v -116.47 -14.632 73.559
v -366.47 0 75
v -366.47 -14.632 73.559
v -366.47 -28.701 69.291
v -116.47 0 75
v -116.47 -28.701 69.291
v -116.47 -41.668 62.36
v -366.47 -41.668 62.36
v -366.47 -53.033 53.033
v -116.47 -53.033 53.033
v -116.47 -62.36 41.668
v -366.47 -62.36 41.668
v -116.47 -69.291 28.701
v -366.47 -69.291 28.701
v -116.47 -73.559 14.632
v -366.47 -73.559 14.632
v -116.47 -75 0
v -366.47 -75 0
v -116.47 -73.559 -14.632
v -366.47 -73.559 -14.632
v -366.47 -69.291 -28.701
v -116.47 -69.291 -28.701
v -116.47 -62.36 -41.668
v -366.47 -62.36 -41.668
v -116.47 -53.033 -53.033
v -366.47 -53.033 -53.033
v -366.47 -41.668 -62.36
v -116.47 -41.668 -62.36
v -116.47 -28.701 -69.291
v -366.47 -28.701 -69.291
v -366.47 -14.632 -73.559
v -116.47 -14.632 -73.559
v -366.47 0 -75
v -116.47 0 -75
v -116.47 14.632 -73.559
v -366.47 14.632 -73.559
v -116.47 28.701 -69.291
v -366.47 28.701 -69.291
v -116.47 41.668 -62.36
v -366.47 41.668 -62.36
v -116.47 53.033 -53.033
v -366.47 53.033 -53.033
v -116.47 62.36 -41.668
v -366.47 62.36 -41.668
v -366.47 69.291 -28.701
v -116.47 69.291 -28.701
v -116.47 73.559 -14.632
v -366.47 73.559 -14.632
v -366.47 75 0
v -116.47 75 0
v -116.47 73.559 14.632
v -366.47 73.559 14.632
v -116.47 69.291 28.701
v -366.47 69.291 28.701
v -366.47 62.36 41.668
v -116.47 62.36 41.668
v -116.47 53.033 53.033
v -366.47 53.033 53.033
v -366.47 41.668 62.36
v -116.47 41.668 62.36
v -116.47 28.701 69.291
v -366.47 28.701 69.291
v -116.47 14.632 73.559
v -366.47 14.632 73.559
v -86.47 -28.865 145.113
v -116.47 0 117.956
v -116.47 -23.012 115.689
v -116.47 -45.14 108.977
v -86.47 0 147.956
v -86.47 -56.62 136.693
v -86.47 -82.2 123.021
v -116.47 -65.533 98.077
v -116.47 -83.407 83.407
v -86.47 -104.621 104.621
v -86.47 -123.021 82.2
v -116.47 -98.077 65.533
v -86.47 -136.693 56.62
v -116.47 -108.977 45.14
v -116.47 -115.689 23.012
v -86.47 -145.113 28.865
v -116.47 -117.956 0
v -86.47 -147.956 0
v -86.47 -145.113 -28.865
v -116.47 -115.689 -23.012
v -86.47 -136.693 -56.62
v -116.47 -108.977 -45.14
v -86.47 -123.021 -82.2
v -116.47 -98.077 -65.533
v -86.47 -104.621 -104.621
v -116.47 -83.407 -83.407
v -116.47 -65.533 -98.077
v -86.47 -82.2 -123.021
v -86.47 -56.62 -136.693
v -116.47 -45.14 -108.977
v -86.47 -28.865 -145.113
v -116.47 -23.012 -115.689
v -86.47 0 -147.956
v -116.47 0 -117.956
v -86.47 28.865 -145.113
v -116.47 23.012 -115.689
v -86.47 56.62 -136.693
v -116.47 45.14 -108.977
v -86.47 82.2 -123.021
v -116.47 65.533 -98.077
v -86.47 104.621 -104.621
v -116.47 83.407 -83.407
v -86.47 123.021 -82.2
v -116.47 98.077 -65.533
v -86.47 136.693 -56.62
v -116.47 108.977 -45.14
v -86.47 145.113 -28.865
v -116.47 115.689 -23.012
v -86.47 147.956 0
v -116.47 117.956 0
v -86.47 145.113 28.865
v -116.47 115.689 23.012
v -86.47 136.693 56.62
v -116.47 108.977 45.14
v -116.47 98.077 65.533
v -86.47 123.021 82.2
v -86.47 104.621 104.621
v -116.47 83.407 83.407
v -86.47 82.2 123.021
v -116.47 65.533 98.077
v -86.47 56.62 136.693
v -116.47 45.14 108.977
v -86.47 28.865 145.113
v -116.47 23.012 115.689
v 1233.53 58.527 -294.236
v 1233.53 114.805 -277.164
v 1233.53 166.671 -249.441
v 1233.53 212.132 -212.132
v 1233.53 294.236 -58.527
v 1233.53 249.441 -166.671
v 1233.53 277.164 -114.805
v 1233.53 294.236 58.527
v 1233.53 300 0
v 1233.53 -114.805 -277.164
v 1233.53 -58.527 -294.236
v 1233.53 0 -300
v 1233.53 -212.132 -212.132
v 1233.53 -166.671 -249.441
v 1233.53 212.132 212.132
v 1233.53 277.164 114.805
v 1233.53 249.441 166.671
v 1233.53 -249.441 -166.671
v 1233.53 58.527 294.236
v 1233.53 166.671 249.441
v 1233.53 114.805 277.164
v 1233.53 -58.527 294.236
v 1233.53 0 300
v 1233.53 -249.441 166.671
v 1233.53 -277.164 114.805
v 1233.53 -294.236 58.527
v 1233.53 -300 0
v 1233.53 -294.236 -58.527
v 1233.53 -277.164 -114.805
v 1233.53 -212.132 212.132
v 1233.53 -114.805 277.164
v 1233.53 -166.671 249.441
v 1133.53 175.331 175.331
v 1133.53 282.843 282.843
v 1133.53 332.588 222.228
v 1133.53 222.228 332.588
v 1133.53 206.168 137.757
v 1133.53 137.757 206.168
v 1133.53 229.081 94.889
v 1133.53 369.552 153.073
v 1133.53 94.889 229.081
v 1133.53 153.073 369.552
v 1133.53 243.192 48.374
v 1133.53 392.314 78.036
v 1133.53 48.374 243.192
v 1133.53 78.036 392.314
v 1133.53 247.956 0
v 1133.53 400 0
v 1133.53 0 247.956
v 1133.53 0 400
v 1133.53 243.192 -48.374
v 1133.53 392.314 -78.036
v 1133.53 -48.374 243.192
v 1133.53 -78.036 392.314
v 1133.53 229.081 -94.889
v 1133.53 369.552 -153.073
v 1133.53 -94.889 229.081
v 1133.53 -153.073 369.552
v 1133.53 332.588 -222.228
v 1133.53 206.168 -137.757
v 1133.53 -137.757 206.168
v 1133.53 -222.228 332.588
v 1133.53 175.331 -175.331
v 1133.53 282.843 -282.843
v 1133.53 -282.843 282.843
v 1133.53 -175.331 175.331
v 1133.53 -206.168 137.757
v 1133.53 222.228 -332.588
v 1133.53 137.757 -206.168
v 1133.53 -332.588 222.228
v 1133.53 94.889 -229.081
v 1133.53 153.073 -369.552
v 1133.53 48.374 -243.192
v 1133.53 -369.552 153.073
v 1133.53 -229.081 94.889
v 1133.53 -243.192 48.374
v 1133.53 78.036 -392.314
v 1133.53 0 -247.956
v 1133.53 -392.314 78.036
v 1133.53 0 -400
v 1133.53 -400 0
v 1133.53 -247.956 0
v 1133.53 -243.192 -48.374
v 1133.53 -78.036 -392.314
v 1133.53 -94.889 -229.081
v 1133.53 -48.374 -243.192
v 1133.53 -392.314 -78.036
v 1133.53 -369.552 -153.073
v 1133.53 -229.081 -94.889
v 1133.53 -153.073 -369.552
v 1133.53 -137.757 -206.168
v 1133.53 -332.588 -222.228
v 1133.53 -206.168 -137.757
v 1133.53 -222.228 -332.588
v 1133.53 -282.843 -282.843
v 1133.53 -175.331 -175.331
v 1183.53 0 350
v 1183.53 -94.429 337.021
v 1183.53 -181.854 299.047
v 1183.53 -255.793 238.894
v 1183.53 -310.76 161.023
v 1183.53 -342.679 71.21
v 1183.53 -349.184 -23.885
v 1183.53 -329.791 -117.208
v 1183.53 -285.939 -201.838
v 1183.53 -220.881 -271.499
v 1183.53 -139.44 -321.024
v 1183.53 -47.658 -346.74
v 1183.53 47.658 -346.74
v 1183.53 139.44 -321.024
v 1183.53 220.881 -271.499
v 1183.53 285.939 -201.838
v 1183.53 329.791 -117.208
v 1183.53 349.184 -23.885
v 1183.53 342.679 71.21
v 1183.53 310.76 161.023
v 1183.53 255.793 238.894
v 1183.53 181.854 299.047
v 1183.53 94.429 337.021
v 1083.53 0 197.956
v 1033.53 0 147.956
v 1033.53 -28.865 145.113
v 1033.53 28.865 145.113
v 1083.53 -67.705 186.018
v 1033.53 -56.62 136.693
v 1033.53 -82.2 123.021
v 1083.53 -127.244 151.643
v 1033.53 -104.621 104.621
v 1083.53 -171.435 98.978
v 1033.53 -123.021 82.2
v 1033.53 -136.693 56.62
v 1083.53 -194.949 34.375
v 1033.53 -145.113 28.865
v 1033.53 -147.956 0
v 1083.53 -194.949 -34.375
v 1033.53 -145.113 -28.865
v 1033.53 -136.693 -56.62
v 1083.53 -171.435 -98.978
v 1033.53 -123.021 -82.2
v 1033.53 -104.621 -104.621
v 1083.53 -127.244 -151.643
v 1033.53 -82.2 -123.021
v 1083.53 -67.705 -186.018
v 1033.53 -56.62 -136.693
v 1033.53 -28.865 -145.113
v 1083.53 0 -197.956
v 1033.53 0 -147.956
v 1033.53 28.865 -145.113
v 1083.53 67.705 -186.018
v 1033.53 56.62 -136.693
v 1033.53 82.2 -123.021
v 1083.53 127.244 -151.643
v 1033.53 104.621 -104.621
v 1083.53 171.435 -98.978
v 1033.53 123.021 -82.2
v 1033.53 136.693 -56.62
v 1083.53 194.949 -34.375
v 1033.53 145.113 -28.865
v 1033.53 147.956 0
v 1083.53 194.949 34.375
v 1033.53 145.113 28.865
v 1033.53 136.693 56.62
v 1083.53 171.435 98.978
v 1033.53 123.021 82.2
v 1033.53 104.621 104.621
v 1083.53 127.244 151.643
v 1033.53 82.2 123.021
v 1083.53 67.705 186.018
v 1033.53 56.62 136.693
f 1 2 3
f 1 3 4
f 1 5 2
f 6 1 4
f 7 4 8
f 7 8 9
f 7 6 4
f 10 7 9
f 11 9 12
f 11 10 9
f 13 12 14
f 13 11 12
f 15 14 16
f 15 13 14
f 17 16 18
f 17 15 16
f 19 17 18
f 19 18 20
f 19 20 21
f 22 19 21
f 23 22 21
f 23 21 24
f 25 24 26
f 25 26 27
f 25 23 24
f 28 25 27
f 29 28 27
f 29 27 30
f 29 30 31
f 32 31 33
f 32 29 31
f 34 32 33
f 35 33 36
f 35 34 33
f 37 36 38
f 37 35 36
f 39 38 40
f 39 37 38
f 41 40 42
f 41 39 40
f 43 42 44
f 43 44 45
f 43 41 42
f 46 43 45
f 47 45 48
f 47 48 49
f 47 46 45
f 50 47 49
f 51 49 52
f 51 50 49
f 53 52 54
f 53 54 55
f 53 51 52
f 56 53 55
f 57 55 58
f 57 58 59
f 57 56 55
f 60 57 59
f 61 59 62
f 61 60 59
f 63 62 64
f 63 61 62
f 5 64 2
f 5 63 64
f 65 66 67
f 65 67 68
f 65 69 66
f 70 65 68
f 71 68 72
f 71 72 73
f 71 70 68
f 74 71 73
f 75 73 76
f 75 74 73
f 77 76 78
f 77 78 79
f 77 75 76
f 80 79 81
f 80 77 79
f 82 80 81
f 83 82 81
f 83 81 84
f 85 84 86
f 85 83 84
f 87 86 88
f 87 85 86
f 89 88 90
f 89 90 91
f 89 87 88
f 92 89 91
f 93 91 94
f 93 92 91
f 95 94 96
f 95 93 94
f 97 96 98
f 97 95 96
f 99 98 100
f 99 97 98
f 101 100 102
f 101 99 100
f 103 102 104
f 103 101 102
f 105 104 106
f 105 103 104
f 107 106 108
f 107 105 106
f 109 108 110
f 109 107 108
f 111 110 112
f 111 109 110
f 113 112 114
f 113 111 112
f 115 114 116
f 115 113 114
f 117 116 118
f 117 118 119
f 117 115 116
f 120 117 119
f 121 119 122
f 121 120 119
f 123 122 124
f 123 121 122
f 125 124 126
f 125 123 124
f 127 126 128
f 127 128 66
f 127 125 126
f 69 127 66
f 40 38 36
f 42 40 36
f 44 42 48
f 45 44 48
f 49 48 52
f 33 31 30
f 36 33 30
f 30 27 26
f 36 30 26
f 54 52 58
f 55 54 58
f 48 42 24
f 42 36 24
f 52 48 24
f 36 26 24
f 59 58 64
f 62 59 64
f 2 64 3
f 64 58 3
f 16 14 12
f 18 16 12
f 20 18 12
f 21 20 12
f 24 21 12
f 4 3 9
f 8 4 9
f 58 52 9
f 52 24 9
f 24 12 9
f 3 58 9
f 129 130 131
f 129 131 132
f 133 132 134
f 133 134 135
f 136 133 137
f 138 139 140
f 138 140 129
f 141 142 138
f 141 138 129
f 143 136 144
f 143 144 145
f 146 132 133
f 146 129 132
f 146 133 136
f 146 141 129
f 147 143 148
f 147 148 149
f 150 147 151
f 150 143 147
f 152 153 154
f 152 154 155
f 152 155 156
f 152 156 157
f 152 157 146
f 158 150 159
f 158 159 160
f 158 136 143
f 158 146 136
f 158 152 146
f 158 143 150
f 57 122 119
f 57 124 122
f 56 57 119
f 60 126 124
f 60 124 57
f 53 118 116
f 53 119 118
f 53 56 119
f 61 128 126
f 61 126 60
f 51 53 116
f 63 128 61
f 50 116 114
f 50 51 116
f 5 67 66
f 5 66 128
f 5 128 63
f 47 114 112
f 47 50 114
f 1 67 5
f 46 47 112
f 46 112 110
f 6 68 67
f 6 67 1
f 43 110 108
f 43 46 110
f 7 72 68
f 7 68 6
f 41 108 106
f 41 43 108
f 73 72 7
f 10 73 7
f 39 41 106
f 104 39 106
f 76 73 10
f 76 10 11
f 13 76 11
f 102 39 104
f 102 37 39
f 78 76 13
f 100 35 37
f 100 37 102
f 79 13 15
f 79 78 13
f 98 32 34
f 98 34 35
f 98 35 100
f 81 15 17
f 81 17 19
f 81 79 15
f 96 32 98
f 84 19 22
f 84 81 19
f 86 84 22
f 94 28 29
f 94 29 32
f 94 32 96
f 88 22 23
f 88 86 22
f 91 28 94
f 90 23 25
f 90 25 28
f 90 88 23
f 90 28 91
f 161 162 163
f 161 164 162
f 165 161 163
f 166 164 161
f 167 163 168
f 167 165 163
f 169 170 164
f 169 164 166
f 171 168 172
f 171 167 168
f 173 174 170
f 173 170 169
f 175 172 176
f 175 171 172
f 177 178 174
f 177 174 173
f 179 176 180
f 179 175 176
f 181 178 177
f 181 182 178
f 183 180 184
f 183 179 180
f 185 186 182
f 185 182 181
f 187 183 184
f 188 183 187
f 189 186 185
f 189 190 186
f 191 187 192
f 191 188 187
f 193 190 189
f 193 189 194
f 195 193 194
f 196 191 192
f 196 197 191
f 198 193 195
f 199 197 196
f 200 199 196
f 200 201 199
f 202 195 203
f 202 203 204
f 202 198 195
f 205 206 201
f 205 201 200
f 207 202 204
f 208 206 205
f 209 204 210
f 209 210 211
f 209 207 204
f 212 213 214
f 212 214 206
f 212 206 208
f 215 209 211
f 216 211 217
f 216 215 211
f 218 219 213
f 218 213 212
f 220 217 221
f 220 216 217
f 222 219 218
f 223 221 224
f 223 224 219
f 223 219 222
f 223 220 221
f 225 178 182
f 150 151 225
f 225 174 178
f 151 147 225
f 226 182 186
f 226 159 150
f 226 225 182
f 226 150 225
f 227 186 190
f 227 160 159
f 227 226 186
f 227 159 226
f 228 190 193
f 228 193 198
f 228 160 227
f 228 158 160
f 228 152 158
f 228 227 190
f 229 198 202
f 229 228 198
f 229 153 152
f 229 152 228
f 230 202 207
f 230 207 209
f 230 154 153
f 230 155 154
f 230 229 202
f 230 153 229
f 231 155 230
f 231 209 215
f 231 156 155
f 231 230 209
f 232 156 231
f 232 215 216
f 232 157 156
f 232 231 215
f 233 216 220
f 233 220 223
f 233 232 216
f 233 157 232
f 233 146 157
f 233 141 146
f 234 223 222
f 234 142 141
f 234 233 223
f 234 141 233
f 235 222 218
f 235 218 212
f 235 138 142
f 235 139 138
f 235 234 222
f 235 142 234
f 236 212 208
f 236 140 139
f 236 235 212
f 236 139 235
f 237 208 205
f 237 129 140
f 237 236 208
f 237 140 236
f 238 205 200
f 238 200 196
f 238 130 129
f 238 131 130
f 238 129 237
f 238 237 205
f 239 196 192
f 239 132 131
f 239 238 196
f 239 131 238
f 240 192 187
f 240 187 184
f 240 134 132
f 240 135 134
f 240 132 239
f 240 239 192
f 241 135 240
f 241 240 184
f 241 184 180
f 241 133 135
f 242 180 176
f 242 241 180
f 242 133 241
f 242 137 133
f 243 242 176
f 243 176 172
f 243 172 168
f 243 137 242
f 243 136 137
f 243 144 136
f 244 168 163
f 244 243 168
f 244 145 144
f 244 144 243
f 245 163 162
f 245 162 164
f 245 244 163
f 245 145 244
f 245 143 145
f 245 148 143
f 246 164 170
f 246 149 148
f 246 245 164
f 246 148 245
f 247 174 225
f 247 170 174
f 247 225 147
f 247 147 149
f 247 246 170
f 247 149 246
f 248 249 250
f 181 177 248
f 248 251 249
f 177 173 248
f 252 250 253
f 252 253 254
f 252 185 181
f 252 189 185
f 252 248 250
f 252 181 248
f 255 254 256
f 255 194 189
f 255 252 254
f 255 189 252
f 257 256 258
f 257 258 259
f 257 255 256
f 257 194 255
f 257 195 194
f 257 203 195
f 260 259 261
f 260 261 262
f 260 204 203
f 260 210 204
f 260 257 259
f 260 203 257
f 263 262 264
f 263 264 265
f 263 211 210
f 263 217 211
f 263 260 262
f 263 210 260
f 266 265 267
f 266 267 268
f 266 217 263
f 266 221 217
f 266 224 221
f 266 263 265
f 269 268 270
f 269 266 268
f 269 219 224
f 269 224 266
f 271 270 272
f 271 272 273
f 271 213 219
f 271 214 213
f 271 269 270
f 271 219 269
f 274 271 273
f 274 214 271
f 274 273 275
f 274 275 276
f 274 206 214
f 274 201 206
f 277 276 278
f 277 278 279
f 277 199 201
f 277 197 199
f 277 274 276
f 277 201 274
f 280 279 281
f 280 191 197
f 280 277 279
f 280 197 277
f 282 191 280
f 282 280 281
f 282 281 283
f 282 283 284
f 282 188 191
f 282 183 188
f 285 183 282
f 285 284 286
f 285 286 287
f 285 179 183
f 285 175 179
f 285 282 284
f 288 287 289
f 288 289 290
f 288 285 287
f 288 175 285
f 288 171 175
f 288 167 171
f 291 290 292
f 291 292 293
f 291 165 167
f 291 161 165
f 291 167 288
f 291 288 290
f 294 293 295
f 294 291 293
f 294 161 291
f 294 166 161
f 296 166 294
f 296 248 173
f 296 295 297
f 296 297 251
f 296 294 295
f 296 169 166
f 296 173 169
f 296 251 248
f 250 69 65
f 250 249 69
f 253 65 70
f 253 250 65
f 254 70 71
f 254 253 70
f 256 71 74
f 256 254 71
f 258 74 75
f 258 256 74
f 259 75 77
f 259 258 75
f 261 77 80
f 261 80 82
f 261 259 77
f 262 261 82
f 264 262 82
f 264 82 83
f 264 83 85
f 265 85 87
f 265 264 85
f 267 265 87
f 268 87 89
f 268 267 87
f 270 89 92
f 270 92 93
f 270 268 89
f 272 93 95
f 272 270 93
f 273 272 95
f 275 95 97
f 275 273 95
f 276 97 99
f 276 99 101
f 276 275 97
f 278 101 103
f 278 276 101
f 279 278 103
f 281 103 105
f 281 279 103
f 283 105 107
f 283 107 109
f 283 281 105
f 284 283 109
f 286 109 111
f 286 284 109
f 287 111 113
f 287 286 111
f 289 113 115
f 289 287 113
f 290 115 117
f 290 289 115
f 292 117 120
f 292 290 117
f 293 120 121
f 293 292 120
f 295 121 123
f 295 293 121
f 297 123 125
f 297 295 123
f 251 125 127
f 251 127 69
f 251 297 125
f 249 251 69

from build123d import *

# Parameters (mm, degrees)
ESQUISSE1_W   = 1120
ESQUISSE1_H   = 147.955968354
ESQUISSE1_W_2 = 250
ESQUISSE1_H_2 = 75


with BuildPart() as part:
    # Esquisse1 → Révolution1 (revolve)
    with BuildSketch(Plane.XY, mode=Mode.PRIVATE) as r_volution1_sk:
        with Locations((473.529943231, -73.977984177)):
            Rectangle(ESQUISSE1_W, ESQUISSE1_H)
        with Locations((-241.470056769, -37.5)):
            Rectangle(ESQUISSE1_W_2, ESQUISSE1_H_2)
        Polygon((-86.470056769, -147.955968354), (-86.470056769, 0), (-116.470056769, 0), (-116.470056769, -75), (-116.470056769, -117.955968354), align=None)
        Polygon((1133.529943231, -247.955968354), (1133.529943231, 0), (1033.529943231, 0), (1033.529943231, -147.955968354), align=None)
        Polygon((1233.529943231, -300), (1233.529943231, 0), (1133.529943231, 0), (1133.529943231, -247.955968354), (1133.529943231, -400), align=None)
    revolve(r_volution1_sk.sketch.rotate(Axis((-576.0190019, 0, 0), (1, 0, 0)), 270), axis=Axis((-576.0190019, 0, 0), (1, 0, 0)))


solid = part.part
